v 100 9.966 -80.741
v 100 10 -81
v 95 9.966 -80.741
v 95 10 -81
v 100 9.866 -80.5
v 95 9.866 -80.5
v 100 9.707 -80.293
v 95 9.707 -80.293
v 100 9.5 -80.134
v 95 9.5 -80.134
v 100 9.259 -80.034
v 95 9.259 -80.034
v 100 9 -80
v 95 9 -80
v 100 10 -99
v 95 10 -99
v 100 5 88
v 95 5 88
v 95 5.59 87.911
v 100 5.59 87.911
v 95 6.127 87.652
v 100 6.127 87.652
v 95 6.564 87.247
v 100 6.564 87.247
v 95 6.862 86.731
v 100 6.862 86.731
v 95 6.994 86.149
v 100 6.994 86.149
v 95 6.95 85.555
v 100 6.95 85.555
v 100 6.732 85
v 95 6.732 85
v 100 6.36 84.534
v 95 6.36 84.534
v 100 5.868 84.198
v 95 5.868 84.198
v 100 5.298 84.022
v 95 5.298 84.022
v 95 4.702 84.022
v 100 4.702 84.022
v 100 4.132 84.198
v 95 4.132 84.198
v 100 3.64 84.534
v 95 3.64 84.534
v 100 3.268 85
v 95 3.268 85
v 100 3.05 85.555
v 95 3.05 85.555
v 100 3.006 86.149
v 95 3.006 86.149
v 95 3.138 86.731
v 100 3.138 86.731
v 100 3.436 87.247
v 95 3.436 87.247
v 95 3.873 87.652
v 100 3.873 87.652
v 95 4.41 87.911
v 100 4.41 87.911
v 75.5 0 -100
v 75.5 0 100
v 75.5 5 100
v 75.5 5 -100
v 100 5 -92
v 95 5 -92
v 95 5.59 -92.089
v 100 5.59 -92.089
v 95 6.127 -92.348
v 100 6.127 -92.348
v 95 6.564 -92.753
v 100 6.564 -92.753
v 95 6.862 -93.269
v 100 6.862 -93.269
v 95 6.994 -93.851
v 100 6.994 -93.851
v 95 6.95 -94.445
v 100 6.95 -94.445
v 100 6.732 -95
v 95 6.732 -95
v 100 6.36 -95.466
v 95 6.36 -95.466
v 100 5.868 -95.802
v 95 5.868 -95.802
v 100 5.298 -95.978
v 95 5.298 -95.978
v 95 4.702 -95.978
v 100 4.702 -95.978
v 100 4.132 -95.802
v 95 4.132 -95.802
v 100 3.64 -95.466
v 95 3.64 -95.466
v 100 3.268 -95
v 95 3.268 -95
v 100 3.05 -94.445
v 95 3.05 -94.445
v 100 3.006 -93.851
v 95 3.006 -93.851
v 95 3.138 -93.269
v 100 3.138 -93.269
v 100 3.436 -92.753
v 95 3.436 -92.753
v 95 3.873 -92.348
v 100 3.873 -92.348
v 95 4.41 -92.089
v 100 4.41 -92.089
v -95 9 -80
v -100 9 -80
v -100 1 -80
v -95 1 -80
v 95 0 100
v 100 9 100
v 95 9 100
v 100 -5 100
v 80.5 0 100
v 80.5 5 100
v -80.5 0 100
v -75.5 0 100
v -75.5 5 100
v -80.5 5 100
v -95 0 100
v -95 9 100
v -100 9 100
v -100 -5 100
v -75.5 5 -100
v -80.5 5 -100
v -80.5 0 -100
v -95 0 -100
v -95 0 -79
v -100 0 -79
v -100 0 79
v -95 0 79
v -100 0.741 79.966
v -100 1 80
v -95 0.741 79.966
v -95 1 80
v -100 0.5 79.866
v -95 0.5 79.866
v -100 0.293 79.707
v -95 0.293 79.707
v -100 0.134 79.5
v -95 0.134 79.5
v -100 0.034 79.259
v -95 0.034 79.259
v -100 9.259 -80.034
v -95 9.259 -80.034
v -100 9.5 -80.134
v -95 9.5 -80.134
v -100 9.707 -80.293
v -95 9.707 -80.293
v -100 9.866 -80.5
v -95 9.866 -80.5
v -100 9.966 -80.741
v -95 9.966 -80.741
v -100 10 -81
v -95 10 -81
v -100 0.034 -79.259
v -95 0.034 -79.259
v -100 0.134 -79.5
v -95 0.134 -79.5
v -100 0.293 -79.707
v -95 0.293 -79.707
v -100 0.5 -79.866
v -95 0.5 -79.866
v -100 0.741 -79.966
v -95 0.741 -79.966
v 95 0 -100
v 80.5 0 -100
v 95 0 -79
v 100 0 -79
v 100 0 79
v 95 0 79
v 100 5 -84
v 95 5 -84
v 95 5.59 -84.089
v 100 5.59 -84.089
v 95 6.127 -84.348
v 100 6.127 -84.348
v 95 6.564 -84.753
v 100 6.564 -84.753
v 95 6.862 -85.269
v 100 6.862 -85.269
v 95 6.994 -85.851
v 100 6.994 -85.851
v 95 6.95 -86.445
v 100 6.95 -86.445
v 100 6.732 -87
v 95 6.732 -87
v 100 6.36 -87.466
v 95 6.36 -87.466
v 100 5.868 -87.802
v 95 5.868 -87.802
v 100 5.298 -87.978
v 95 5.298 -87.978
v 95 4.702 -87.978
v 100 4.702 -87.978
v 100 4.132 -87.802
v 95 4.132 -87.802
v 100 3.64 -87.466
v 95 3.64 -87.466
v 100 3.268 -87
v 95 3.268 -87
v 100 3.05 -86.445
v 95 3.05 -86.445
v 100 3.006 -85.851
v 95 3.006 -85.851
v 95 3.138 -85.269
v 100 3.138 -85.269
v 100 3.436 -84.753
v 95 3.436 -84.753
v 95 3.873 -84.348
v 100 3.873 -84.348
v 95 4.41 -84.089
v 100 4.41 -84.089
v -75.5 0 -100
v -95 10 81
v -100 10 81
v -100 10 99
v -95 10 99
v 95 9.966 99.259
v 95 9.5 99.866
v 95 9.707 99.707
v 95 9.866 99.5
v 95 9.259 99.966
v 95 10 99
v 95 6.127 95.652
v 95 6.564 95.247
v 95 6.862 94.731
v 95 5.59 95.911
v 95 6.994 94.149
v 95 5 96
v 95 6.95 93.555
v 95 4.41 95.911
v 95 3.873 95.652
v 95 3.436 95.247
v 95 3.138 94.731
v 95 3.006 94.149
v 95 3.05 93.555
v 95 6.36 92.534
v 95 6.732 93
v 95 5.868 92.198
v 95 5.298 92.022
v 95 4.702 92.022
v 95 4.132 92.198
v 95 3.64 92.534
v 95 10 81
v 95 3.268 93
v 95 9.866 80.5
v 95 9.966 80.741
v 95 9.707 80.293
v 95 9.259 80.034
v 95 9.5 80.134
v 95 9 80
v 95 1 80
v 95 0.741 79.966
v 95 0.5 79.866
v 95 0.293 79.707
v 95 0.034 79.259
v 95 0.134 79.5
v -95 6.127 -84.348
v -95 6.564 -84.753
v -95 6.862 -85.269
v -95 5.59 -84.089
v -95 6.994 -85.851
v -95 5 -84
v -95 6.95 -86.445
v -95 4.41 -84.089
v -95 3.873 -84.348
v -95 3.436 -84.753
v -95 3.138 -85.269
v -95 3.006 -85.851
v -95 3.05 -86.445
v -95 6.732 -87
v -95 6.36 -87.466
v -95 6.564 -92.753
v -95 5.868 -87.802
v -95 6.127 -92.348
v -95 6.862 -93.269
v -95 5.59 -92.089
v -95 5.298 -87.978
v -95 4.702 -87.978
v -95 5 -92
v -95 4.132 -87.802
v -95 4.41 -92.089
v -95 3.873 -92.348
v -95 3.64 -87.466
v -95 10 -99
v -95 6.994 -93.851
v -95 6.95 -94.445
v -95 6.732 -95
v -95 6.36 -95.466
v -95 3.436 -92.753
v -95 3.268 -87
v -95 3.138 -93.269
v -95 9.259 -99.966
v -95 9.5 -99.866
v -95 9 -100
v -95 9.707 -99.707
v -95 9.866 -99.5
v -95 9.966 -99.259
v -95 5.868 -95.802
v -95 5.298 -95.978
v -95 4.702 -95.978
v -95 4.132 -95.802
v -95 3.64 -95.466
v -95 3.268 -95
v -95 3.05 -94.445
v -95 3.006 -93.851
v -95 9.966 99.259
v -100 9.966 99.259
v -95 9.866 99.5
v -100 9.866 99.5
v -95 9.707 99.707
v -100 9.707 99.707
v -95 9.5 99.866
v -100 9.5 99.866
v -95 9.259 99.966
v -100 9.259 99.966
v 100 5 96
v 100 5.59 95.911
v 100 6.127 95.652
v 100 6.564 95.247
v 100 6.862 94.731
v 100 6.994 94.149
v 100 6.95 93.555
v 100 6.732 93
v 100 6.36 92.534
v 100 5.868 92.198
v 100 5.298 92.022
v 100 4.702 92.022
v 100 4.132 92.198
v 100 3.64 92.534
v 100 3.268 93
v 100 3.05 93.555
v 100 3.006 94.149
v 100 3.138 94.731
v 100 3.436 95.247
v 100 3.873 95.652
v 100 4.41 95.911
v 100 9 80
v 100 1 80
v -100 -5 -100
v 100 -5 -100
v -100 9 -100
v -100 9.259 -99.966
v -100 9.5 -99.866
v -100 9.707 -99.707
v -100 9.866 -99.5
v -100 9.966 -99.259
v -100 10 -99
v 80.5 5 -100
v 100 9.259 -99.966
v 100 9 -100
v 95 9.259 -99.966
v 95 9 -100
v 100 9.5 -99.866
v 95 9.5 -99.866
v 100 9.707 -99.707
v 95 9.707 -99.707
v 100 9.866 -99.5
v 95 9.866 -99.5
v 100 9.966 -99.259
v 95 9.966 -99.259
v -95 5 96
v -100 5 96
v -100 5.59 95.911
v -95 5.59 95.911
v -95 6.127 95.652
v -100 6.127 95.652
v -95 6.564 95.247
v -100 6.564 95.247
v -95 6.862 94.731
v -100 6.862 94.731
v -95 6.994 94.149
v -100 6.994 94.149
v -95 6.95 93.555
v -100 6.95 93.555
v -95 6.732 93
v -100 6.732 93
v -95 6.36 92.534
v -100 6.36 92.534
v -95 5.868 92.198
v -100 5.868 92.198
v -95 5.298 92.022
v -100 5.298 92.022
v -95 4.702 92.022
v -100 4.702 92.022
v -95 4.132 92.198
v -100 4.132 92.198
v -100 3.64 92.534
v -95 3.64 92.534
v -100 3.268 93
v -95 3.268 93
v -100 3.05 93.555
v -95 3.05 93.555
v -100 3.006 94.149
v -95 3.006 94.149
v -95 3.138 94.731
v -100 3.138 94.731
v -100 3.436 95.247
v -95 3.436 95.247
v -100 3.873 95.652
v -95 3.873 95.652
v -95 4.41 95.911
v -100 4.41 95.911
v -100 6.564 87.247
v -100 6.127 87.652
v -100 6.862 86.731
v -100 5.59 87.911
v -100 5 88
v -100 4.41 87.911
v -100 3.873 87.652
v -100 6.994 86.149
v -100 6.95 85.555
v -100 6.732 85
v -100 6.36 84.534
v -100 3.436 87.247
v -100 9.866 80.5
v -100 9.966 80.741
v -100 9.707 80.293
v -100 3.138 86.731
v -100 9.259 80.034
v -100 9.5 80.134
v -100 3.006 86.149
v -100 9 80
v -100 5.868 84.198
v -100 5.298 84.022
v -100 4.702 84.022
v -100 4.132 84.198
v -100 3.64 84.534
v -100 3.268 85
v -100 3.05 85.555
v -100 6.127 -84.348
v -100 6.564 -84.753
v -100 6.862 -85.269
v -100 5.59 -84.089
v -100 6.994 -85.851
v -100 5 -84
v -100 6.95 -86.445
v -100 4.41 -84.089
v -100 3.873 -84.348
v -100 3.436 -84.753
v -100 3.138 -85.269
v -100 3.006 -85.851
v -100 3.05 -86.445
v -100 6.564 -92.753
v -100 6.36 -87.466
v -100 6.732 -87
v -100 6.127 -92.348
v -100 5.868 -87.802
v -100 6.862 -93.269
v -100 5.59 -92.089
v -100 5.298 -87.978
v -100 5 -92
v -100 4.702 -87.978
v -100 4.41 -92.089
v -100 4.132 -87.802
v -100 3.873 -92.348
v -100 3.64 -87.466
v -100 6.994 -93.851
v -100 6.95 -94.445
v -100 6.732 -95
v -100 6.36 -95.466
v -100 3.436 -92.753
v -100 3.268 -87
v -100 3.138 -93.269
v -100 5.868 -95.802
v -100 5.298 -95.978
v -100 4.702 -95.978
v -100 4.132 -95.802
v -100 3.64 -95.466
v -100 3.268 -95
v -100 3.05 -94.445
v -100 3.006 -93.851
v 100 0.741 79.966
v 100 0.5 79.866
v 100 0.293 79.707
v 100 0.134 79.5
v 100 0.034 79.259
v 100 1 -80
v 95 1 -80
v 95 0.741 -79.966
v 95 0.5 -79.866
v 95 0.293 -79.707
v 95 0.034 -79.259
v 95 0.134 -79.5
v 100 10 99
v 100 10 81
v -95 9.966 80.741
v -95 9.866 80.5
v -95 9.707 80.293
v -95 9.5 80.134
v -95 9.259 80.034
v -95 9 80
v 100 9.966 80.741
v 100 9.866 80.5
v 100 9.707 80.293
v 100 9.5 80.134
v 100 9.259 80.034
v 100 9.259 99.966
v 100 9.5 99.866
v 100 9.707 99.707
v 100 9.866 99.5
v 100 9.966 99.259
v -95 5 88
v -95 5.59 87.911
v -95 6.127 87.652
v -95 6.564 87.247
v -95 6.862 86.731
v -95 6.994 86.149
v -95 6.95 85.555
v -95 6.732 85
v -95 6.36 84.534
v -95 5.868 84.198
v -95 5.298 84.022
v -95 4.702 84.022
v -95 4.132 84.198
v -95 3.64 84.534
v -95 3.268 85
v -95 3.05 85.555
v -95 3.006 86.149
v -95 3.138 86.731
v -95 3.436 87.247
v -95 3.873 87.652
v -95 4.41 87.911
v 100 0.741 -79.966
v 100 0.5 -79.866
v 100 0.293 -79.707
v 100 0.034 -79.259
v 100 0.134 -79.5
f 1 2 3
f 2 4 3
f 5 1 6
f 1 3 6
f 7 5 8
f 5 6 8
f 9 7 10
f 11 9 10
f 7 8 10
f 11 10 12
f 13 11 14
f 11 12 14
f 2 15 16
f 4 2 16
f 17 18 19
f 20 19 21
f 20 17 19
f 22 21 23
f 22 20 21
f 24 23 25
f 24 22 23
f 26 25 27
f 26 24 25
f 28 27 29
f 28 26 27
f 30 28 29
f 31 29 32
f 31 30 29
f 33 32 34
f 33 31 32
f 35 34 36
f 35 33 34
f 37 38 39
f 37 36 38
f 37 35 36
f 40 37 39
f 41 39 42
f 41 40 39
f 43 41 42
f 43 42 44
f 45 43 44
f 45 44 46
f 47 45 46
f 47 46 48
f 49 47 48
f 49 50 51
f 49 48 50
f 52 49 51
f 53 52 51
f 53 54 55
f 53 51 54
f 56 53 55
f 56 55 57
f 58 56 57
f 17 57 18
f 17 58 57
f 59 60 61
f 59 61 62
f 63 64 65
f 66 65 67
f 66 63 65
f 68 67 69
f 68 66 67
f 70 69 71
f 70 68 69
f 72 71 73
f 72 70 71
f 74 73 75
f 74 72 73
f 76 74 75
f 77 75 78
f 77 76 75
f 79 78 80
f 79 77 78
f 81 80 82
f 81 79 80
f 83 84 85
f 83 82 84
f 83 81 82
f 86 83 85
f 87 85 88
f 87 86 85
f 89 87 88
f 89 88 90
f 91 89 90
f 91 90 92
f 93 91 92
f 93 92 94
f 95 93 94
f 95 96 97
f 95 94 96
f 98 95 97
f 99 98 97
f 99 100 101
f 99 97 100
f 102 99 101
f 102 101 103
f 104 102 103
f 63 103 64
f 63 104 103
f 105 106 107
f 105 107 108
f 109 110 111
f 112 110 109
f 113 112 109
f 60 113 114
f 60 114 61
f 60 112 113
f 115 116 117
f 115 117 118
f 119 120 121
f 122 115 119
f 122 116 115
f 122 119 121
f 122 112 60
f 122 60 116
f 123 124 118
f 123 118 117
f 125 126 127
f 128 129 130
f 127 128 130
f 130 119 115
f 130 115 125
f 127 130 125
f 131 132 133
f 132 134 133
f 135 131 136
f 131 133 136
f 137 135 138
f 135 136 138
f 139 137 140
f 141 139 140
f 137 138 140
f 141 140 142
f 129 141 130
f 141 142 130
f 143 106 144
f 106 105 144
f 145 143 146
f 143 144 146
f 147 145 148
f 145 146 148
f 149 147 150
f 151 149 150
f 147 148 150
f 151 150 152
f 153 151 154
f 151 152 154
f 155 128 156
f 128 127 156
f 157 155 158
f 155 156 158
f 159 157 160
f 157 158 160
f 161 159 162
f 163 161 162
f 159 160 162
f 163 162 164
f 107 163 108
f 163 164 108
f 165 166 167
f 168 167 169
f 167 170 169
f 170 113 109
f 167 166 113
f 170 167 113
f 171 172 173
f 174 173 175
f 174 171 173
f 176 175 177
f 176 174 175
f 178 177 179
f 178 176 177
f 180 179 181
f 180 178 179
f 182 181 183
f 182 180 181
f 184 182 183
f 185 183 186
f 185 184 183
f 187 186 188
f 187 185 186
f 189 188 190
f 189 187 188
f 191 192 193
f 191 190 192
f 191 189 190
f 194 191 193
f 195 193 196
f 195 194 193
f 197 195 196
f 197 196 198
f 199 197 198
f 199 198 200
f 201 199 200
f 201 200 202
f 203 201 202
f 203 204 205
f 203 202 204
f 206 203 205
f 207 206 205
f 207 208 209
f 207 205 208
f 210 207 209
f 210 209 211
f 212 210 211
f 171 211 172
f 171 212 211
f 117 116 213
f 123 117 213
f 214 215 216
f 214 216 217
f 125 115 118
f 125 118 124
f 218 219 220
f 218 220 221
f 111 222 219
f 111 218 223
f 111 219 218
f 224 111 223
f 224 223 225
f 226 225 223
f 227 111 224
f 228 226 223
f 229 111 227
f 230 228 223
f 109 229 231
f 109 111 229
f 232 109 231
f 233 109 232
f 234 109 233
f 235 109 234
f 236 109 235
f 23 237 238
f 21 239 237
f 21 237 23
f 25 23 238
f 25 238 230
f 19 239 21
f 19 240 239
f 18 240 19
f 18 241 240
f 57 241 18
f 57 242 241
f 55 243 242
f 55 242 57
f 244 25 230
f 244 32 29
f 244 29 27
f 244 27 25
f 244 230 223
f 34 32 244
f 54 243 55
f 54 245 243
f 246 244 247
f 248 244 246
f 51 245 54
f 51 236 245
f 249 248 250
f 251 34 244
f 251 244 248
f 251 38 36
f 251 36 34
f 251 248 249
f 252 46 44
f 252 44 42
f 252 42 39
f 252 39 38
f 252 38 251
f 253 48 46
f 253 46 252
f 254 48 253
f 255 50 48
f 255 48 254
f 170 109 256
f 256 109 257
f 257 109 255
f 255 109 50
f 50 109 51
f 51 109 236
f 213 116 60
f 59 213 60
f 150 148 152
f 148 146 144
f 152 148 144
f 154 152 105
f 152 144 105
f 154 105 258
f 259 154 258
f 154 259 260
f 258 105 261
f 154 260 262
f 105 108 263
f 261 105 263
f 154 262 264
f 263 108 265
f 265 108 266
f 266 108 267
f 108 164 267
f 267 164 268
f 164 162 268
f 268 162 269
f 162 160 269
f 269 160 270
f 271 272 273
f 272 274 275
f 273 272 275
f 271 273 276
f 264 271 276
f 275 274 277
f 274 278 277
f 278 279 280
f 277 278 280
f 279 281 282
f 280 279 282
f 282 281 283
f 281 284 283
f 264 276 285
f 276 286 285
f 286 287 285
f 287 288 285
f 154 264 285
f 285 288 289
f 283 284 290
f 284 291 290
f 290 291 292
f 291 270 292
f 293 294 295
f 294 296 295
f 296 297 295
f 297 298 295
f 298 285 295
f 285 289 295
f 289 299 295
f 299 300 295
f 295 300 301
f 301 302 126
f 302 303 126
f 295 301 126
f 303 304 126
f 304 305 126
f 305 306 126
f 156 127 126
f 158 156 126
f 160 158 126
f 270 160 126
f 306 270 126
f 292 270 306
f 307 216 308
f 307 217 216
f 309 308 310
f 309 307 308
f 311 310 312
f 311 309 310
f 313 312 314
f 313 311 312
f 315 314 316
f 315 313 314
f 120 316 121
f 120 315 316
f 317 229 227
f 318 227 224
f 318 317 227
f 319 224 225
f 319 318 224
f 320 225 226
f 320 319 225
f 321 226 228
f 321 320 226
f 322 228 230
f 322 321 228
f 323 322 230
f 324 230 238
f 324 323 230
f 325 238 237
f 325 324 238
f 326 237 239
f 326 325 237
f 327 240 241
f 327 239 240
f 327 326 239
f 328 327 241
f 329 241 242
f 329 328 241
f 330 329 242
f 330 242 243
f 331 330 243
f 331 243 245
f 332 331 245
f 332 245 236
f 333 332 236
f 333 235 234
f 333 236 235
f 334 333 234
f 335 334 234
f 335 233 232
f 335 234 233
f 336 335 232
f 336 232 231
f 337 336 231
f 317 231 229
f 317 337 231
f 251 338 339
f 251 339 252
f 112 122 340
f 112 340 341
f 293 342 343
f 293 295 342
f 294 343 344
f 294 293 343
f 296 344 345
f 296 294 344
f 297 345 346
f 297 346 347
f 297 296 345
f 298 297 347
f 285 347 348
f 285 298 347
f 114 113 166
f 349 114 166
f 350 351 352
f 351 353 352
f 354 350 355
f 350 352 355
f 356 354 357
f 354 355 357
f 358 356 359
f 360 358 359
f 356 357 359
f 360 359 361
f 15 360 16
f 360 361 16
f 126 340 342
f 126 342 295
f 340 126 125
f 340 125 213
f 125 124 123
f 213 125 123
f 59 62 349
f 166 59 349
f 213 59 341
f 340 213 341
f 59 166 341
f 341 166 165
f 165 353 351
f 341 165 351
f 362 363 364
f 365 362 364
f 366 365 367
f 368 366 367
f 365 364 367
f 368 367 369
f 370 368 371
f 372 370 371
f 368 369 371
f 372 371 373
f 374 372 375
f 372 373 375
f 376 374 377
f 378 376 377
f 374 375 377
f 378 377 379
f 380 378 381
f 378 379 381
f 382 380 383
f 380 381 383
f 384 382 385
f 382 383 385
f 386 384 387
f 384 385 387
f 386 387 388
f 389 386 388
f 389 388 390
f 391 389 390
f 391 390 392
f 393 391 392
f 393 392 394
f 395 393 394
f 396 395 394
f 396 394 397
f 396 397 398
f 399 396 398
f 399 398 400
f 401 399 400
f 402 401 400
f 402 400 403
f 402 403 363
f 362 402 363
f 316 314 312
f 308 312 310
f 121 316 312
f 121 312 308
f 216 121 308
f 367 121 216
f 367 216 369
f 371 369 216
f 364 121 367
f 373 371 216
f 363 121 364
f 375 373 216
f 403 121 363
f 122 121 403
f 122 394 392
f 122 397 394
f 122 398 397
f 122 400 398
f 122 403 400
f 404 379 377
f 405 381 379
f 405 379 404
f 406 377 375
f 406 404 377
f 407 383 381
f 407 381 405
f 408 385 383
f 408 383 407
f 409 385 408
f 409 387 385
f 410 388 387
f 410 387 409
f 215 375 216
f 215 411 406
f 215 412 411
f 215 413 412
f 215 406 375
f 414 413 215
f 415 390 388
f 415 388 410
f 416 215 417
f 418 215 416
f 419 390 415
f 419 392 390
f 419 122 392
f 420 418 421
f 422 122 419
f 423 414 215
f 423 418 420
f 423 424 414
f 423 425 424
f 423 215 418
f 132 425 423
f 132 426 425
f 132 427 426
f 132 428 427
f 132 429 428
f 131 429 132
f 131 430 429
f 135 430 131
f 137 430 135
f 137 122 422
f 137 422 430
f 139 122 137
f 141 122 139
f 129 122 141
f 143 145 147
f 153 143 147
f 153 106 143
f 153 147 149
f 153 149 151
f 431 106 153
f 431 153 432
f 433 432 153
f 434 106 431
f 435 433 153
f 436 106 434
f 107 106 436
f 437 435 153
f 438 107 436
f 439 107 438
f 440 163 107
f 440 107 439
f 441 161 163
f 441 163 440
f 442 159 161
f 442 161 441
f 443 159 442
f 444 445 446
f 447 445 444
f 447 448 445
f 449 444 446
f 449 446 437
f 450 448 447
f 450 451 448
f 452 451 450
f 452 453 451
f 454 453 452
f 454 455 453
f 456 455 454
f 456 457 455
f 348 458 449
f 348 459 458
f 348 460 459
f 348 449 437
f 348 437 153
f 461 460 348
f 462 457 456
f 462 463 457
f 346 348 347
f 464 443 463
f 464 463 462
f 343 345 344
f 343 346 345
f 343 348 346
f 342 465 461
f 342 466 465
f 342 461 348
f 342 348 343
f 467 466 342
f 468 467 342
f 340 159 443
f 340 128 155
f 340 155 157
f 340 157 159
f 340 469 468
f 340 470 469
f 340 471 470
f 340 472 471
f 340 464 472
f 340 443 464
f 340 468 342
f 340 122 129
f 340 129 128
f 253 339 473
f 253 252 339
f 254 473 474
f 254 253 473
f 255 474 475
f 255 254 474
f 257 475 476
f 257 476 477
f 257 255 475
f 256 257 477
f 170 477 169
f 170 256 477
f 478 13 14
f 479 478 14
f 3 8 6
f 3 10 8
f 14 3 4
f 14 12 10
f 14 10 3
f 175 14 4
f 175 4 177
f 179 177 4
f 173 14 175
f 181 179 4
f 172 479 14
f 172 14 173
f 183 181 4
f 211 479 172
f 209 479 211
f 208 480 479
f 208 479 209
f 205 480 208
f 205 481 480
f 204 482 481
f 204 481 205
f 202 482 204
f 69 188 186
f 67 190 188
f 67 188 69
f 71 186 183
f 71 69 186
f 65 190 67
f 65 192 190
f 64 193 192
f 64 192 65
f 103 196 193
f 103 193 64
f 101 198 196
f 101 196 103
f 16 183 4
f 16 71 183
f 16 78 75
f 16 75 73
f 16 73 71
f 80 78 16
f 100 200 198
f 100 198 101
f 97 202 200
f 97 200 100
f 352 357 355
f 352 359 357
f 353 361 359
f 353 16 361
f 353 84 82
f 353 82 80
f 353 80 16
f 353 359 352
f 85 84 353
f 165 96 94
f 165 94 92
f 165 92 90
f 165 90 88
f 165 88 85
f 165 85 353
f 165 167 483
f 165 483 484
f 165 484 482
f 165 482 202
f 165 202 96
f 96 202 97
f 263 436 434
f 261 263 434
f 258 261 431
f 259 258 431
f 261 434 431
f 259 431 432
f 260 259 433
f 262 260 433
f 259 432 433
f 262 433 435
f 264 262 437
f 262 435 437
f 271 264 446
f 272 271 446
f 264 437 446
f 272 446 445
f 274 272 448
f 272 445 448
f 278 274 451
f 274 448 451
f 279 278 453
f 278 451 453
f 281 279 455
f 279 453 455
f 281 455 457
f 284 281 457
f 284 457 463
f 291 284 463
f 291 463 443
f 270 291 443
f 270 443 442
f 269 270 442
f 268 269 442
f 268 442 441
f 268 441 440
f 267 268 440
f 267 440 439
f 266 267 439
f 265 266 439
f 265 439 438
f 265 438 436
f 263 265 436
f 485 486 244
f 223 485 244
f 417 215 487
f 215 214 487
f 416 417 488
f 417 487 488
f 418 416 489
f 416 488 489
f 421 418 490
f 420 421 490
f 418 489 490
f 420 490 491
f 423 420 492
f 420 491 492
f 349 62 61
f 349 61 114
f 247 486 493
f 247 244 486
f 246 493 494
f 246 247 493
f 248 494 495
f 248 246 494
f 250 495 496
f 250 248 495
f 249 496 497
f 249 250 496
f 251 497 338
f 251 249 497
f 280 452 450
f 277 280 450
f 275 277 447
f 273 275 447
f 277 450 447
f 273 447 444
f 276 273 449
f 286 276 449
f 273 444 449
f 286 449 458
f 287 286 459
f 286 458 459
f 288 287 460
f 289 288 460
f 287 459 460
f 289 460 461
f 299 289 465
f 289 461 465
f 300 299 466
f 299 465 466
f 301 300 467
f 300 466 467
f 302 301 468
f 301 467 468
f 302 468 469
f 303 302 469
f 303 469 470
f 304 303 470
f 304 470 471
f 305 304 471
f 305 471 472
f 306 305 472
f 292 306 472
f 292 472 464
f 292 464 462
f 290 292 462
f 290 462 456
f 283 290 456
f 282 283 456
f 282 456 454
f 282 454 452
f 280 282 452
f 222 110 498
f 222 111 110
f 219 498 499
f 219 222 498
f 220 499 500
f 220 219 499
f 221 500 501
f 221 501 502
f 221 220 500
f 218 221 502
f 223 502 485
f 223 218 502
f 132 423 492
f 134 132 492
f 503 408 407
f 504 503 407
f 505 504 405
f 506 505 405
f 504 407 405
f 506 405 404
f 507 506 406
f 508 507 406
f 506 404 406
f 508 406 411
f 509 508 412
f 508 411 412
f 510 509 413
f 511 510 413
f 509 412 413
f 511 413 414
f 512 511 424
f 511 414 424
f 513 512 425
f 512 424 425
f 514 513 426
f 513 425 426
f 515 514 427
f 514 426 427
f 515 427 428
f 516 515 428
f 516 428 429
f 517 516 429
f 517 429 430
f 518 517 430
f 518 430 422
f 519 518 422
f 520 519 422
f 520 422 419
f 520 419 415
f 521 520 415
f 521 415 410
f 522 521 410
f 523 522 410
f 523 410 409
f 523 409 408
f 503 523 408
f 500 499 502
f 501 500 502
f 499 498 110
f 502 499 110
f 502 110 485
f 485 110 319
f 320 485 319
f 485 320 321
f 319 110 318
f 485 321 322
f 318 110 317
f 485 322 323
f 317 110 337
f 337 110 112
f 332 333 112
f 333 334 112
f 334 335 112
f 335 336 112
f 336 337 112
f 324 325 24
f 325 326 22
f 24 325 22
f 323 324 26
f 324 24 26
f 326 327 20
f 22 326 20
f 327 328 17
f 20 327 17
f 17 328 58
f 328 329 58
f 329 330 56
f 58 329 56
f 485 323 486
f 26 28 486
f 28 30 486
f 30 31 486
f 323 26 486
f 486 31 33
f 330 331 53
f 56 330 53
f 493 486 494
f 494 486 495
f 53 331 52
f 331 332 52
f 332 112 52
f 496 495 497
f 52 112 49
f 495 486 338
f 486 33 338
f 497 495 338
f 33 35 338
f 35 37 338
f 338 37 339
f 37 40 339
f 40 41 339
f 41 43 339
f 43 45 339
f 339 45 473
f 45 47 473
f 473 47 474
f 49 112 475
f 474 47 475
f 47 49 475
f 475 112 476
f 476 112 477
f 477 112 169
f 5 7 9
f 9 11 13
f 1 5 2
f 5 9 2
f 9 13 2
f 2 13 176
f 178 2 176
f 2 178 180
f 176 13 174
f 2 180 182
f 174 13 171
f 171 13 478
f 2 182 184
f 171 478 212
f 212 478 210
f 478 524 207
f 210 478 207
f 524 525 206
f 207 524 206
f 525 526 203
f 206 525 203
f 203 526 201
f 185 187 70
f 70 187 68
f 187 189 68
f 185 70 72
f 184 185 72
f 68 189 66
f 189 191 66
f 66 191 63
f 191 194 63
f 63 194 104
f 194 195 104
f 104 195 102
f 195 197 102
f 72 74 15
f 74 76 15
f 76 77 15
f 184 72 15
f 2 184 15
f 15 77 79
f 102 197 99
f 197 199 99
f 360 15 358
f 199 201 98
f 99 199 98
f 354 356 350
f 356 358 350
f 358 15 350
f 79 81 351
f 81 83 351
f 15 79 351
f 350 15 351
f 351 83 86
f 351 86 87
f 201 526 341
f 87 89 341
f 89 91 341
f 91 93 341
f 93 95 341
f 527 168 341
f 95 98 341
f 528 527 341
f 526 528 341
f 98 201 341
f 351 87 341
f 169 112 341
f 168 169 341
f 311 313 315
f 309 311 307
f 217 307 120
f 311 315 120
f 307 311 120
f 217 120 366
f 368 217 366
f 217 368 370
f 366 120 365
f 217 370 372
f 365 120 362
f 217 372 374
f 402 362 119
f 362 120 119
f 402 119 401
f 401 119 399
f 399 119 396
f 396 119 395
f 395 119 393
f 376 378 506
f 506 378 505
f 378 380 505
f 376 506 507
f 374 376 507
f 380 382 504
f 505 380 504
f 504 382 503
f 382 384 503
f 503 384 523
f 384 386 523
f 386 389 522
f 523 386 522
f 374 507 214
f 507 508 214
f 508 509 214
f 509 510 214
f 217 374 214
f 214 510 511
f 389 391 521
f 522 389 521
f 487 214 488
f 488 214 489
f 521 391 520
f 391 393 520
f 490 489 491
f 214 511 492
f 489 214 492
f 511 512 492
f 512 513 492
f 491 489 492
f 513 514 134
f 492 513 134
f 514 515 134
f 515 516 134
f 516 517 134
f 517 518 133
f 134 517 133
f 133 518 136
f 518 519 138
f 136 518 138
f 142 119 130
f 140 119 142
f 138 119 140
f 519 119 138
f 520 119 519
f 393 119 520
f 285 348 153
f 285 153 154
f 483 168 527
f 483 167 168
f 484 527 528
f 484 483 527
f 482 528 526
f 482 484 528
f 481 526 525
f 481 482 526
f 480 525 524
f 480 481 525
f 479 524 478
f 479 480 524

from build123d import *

# Parameters (mm, degrees)
SKETCH1_W            = 200
SKETCH1_H            = 5
BOSS_EXTRUDE1_DEPTH  = 100
SKETCH2_W            = 5
SKETCH2_H            = 200
BOSS_EXTRUDE2_DEPTH  = 5
SKETCH3_W            = 5
SKETCH3_H            = 20
BOSS_EXTRUDE3_DEPTH  = 10
SKETCH4_R            = 2
CUT_EXTRUDE1_DEPTH   = 10
FILLET1_R            = 1
FILLET1_OF_MIRROR1_R = 1


with BuildPart() as part:
    # Sketch1 → Boss-Extrude1 (new, symmetric)
    with BuildSketch(Plane.XY):
        with Locations((0, -2.5)):
            Rectangle(SKETCH1_W, SKETCH1_H)
    extrude(amount=BOSS_EXTRUDE1_DEPTH, both=True)

    # Sketch2 → Boss-Extrude2 (add)
    with BuildSketch(Plane(origin=(0, 0, 0), x_dir=(1, 0, 0), z_dir=(0, 1, 0))):
        with Locations((-78, 0)):
            Rectangle(SKETCH2_W, SKETCH2_H)
        with Locations((78, 0)):
            Rectangle(SKETCH2_W, SKETCH2_H)
    extrude(amount=BOSS_EXTRUDE2_DEPTH)

    # Sketch3 → Boss-Extrude3 (add)
    with BuildSketch(Plane(origin=(0, 0, 0), x_dir=(1, 0, 0), z_dir=(0, 1, 0))):
        with Locations((-97.5, -90)):
            Rectangle(SKETCH3_W, SKETCH3_H)
        with Locations((-97.5, 90)):
            Rectangle(SKETCH3_W, SKETCH3_H)
    boss_extrude3 = extrude(amount=BOSS_EXTRUDE3_DEPTH)

    # Sketch4 → Cut-Extrude1 (cut)
    with BuildSketch(Plane.ZY.offset(100)):
        with Locations((-86, 5)):
            Circle(SKETCH4_R)
        with Locations((-94, 5)):
            Circle(SKETCH4_R)
        with Locations((94, 5)):
            Circle(SKETCH4_R)
        with Locations((86, 5)):
            Circle(SKETCH4_R)
        with Locations((-86, 5)):
            Circle(SKETCH4_R)
        with Locations((-94, 5)):
            Circle(SKETCH4_R)
    cut_extrude1 = extrude(amount=-CUT_EXTRUDE1_DEPTH, mode=Mode.SUBTRACT)

    # Fillet1
    fillet1_edges = [part.edges().sort_by_distance(p)[0] for p in [
        (-97.5, 0, 80),
        (-97.5, 10, 100),
        (-97.5, 10, 80),
        (-97.5, 0, -80),
        (-97.5, 10, -100),
        (-97.5, 10, -80),
    ]]
    fillet(fillet1_edges, radius=FILLET1_R)

    # Mirror1: Boss-Extrude3, Cut-Extrude1 across plane
    add(boss_extrude3.mirror(Plane(origin=(0, 0, 0), x_dir=(0, 0, 1), z_dir=(1, 0, 0))))
    add(cut_extrude1.mirror(Plane(origin=(0, 0, 0), x_dir=(0, 0, 1), z_dir=(1, 0, 0))), mode=Mode.SUBTRACT)

    # Fillet1 of Mirror1
    fillet1_of_mirror1_edges = [part.edges().sort_by_distance(p)[0] for p in [
        (97.5, 0, 80),
        (97.5, 10, 100),
        (97.5, 10, 80),
        (97.5, 0, -80),
        (97.5, 10, -100),
        (97.5, 10, -80),
    ]]
    fillet(fillet1_of_mirror1_edges, radius=FILLET1_OF_MIRROR1_R)


solid = part.part
